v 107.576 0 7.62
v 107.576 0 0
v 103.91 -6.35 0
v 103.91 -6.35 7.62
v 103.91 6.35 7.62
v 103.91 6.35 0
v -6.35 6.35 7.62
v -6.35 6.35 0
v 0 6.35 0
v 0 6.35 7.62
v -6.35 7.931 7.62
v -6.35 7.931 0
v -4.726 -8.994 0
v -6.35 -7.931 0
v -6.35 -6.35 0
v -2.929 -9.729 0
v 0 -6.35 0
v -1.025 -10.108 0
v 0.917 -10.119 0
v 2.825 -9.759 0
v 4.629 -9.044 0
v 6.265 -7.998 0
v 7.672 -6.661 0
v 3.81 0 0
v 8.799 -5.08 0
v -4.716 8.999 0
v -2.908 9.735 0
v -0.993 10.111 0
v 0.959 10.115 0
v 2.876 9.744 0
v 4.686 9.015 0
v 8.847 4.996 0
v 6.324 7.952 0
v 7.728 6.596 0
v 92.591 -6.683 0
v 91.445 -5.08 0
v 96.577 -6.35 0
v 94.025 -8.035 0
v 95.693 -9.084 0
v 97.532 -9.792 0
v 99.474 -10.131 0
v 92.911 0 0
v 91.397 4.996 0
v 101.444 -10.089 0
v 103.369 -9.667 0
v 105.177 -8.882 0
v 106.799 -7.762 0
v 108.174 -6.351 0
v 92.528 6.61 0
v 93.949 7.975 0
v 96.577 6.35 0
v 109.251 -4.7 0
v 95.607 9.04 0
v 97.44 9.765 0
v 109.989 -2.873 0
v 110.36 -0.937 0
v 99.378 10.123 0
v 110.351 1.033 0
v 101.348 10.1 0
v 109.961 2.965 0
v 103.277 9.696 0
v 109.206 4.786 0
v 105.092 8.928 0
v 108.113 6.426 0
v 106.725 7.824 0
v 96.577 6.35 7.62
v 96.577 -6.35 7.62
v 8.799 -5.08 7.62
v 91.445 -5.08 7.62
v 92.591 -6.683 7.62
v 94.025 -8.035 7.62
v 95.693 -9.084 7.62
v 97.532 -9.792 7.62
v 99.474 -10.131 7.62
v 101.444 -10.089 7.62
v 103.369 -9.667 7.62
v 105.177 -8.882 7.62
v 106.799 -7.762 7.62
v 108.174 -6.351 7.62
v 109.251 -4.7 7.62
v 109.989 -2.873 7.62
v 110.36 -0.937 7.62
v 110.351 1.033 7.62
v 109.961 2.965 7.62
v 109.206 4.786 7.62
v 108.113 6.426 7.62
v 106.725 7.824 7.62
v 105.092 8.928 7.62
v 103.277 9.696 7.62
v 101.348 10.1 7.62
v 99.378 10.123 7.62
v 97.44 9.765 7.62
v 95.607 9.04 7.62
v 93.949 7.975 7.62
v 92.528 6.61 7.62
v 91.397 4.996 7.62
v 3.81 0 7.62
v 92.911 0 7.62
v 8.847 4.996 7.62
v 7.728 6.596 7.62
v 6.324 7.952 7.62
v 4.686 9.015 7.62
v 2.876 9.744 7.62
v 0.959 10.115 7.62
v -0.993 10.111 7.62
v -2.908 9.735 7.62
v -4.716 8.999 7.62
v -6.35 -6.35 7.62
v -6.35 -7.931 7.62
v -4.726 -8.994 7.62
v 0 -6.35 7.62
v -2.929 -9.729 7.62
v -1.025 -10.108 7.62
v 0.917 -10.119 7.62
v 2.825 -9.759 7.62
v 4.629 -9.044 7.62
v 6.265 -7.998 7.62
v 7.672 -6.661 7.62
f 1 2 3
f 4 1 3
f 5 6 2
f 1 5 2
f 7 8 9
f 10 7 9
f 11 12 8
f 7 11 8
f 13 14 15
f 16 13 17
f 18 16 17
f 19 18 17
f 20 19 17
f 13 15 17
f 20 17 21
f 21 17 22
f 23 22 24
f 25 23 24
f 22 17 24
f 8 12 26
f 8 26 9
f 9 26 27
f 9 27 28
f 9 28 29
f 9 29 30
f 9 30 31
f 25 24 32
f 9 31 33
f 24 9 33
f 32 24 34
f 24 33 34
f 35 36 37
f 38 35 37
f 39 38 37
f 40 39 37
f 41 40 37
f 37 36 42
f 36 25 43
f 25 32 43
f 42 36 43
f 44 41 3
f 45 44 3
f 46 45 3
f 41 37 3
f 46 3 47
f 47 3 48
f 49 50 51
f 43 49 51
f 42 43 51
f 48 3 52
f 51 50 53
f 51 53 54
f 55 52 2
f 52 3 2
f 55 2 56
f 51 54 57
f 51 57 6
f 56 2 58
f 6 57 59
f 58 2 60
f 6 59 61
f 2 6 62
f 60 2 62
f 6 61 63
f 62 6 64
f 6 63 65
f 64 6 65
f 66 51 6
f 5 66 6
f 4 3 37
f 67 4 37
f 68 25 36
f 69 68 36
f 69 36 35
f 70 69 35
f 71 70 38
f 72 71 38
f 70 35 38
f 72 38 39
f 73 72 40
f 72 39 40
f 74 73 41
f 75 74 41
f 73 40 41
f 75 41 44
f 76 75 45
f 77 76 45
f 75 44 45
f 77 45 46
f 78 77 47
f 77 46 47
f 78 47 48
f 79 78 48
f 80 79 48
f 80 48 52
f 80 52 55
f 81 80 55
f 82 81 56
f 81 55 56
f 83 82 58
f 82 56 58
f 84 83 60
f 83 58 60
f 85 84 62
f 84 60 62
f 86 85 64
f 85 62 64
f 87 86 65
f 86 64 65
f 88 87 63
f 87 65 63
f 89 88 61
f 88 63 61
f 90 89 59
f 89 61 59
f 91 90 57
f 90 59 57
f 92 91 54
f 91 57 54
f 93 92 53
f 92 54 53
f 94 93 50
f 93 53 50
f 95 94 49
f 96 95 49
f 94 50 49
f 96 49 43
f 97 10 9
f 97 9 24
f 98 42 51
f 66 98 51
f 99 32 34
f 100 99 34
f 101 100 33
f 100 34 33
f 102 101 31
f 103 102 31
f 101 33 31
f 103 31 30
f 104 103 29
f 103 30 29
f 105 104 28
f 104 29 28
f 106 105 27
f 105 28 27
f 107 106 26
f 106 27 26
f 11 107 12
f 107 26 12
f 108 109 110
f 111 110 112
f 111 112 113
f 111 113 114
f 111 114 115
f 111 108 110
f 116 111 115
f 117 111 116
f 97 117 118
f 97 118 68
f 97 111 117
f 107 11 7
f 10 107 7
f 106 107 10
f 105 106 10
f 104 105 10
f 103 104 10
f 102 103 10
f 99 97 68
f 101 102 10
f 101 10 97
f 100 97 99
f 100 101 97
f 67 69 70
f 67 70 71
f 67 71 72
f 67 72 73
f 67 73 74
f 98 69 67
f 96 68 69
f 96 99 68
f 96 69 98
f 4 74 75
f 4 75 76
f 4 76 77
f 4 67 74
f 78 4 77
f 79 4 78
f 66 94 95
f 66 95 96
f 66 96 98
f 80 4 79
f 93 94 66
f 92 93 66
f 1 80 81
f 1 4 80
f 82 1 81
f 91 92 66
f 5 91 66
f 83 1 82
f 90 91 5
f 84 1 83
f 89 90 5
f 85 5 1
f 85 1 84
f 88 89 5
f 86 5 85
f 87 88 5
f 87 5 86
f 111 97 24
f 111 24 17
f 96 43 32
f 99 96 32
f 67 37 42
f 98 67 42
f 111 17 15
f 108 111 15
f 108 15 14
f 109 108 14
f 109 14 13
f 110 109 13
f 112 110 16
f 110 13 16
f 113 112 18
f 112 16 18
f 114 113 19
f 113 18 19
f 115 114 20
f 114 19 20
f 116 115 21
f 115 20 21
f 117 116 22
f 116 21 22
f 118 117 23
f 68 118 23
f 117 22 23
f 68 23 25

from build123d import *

# Parameters (mm, degrees)
BOSS_EXTRUDE2_DEPTH = 7.62


with BuildPart() as part:
    # Sketch1 → Boss-Extrude2 (new body)
    with BuildSketch(Plane.XY):
        with BuildLine():
            Line((8.798818102, -5.08), (91.44451632, -5.08))
            ThreePointArc((91.44451632, -5.08), (110.403219868, 0.048246477), (91.396667211, 4.996206486))
            Line((91.396667211, 4.996206486), (8.846667211, 4.996206486))
            ThreePointArc((8.846667211, 4.996206486), (1.926604894, 9.975660057), (-6.35, 7.931147458))
            Line((-6.35, 7.931147458), (-6.35, 6.35))
            Line((-6.35, 6.35), (0, 6.35))
            Line((0, 6.35), (3.81, 0))
            Line((3.81, 0), (0, -6.35))
            Line((0, -6.35), (-6.35, -6.35))
            Line((-6.35, -6.35), (-6.35, -7.931147458))
            ThreePointArc((-6.35, -7.931147458), (1.879212064, -9.984696391), (8.798818102, -5.08))
        make_face()
        Polygon((96.577160213, 6.35), (103.909508632, 6.35), (107.575682841, 0), (103.909508632, -6.35), (96.577160213, -6.35), (92.910986004, 0), align=None, mode=Mode.SUBTRACT)
    extrude(amount=BOSS_EXTRUDE2_DEPTH)


solid = part.part
